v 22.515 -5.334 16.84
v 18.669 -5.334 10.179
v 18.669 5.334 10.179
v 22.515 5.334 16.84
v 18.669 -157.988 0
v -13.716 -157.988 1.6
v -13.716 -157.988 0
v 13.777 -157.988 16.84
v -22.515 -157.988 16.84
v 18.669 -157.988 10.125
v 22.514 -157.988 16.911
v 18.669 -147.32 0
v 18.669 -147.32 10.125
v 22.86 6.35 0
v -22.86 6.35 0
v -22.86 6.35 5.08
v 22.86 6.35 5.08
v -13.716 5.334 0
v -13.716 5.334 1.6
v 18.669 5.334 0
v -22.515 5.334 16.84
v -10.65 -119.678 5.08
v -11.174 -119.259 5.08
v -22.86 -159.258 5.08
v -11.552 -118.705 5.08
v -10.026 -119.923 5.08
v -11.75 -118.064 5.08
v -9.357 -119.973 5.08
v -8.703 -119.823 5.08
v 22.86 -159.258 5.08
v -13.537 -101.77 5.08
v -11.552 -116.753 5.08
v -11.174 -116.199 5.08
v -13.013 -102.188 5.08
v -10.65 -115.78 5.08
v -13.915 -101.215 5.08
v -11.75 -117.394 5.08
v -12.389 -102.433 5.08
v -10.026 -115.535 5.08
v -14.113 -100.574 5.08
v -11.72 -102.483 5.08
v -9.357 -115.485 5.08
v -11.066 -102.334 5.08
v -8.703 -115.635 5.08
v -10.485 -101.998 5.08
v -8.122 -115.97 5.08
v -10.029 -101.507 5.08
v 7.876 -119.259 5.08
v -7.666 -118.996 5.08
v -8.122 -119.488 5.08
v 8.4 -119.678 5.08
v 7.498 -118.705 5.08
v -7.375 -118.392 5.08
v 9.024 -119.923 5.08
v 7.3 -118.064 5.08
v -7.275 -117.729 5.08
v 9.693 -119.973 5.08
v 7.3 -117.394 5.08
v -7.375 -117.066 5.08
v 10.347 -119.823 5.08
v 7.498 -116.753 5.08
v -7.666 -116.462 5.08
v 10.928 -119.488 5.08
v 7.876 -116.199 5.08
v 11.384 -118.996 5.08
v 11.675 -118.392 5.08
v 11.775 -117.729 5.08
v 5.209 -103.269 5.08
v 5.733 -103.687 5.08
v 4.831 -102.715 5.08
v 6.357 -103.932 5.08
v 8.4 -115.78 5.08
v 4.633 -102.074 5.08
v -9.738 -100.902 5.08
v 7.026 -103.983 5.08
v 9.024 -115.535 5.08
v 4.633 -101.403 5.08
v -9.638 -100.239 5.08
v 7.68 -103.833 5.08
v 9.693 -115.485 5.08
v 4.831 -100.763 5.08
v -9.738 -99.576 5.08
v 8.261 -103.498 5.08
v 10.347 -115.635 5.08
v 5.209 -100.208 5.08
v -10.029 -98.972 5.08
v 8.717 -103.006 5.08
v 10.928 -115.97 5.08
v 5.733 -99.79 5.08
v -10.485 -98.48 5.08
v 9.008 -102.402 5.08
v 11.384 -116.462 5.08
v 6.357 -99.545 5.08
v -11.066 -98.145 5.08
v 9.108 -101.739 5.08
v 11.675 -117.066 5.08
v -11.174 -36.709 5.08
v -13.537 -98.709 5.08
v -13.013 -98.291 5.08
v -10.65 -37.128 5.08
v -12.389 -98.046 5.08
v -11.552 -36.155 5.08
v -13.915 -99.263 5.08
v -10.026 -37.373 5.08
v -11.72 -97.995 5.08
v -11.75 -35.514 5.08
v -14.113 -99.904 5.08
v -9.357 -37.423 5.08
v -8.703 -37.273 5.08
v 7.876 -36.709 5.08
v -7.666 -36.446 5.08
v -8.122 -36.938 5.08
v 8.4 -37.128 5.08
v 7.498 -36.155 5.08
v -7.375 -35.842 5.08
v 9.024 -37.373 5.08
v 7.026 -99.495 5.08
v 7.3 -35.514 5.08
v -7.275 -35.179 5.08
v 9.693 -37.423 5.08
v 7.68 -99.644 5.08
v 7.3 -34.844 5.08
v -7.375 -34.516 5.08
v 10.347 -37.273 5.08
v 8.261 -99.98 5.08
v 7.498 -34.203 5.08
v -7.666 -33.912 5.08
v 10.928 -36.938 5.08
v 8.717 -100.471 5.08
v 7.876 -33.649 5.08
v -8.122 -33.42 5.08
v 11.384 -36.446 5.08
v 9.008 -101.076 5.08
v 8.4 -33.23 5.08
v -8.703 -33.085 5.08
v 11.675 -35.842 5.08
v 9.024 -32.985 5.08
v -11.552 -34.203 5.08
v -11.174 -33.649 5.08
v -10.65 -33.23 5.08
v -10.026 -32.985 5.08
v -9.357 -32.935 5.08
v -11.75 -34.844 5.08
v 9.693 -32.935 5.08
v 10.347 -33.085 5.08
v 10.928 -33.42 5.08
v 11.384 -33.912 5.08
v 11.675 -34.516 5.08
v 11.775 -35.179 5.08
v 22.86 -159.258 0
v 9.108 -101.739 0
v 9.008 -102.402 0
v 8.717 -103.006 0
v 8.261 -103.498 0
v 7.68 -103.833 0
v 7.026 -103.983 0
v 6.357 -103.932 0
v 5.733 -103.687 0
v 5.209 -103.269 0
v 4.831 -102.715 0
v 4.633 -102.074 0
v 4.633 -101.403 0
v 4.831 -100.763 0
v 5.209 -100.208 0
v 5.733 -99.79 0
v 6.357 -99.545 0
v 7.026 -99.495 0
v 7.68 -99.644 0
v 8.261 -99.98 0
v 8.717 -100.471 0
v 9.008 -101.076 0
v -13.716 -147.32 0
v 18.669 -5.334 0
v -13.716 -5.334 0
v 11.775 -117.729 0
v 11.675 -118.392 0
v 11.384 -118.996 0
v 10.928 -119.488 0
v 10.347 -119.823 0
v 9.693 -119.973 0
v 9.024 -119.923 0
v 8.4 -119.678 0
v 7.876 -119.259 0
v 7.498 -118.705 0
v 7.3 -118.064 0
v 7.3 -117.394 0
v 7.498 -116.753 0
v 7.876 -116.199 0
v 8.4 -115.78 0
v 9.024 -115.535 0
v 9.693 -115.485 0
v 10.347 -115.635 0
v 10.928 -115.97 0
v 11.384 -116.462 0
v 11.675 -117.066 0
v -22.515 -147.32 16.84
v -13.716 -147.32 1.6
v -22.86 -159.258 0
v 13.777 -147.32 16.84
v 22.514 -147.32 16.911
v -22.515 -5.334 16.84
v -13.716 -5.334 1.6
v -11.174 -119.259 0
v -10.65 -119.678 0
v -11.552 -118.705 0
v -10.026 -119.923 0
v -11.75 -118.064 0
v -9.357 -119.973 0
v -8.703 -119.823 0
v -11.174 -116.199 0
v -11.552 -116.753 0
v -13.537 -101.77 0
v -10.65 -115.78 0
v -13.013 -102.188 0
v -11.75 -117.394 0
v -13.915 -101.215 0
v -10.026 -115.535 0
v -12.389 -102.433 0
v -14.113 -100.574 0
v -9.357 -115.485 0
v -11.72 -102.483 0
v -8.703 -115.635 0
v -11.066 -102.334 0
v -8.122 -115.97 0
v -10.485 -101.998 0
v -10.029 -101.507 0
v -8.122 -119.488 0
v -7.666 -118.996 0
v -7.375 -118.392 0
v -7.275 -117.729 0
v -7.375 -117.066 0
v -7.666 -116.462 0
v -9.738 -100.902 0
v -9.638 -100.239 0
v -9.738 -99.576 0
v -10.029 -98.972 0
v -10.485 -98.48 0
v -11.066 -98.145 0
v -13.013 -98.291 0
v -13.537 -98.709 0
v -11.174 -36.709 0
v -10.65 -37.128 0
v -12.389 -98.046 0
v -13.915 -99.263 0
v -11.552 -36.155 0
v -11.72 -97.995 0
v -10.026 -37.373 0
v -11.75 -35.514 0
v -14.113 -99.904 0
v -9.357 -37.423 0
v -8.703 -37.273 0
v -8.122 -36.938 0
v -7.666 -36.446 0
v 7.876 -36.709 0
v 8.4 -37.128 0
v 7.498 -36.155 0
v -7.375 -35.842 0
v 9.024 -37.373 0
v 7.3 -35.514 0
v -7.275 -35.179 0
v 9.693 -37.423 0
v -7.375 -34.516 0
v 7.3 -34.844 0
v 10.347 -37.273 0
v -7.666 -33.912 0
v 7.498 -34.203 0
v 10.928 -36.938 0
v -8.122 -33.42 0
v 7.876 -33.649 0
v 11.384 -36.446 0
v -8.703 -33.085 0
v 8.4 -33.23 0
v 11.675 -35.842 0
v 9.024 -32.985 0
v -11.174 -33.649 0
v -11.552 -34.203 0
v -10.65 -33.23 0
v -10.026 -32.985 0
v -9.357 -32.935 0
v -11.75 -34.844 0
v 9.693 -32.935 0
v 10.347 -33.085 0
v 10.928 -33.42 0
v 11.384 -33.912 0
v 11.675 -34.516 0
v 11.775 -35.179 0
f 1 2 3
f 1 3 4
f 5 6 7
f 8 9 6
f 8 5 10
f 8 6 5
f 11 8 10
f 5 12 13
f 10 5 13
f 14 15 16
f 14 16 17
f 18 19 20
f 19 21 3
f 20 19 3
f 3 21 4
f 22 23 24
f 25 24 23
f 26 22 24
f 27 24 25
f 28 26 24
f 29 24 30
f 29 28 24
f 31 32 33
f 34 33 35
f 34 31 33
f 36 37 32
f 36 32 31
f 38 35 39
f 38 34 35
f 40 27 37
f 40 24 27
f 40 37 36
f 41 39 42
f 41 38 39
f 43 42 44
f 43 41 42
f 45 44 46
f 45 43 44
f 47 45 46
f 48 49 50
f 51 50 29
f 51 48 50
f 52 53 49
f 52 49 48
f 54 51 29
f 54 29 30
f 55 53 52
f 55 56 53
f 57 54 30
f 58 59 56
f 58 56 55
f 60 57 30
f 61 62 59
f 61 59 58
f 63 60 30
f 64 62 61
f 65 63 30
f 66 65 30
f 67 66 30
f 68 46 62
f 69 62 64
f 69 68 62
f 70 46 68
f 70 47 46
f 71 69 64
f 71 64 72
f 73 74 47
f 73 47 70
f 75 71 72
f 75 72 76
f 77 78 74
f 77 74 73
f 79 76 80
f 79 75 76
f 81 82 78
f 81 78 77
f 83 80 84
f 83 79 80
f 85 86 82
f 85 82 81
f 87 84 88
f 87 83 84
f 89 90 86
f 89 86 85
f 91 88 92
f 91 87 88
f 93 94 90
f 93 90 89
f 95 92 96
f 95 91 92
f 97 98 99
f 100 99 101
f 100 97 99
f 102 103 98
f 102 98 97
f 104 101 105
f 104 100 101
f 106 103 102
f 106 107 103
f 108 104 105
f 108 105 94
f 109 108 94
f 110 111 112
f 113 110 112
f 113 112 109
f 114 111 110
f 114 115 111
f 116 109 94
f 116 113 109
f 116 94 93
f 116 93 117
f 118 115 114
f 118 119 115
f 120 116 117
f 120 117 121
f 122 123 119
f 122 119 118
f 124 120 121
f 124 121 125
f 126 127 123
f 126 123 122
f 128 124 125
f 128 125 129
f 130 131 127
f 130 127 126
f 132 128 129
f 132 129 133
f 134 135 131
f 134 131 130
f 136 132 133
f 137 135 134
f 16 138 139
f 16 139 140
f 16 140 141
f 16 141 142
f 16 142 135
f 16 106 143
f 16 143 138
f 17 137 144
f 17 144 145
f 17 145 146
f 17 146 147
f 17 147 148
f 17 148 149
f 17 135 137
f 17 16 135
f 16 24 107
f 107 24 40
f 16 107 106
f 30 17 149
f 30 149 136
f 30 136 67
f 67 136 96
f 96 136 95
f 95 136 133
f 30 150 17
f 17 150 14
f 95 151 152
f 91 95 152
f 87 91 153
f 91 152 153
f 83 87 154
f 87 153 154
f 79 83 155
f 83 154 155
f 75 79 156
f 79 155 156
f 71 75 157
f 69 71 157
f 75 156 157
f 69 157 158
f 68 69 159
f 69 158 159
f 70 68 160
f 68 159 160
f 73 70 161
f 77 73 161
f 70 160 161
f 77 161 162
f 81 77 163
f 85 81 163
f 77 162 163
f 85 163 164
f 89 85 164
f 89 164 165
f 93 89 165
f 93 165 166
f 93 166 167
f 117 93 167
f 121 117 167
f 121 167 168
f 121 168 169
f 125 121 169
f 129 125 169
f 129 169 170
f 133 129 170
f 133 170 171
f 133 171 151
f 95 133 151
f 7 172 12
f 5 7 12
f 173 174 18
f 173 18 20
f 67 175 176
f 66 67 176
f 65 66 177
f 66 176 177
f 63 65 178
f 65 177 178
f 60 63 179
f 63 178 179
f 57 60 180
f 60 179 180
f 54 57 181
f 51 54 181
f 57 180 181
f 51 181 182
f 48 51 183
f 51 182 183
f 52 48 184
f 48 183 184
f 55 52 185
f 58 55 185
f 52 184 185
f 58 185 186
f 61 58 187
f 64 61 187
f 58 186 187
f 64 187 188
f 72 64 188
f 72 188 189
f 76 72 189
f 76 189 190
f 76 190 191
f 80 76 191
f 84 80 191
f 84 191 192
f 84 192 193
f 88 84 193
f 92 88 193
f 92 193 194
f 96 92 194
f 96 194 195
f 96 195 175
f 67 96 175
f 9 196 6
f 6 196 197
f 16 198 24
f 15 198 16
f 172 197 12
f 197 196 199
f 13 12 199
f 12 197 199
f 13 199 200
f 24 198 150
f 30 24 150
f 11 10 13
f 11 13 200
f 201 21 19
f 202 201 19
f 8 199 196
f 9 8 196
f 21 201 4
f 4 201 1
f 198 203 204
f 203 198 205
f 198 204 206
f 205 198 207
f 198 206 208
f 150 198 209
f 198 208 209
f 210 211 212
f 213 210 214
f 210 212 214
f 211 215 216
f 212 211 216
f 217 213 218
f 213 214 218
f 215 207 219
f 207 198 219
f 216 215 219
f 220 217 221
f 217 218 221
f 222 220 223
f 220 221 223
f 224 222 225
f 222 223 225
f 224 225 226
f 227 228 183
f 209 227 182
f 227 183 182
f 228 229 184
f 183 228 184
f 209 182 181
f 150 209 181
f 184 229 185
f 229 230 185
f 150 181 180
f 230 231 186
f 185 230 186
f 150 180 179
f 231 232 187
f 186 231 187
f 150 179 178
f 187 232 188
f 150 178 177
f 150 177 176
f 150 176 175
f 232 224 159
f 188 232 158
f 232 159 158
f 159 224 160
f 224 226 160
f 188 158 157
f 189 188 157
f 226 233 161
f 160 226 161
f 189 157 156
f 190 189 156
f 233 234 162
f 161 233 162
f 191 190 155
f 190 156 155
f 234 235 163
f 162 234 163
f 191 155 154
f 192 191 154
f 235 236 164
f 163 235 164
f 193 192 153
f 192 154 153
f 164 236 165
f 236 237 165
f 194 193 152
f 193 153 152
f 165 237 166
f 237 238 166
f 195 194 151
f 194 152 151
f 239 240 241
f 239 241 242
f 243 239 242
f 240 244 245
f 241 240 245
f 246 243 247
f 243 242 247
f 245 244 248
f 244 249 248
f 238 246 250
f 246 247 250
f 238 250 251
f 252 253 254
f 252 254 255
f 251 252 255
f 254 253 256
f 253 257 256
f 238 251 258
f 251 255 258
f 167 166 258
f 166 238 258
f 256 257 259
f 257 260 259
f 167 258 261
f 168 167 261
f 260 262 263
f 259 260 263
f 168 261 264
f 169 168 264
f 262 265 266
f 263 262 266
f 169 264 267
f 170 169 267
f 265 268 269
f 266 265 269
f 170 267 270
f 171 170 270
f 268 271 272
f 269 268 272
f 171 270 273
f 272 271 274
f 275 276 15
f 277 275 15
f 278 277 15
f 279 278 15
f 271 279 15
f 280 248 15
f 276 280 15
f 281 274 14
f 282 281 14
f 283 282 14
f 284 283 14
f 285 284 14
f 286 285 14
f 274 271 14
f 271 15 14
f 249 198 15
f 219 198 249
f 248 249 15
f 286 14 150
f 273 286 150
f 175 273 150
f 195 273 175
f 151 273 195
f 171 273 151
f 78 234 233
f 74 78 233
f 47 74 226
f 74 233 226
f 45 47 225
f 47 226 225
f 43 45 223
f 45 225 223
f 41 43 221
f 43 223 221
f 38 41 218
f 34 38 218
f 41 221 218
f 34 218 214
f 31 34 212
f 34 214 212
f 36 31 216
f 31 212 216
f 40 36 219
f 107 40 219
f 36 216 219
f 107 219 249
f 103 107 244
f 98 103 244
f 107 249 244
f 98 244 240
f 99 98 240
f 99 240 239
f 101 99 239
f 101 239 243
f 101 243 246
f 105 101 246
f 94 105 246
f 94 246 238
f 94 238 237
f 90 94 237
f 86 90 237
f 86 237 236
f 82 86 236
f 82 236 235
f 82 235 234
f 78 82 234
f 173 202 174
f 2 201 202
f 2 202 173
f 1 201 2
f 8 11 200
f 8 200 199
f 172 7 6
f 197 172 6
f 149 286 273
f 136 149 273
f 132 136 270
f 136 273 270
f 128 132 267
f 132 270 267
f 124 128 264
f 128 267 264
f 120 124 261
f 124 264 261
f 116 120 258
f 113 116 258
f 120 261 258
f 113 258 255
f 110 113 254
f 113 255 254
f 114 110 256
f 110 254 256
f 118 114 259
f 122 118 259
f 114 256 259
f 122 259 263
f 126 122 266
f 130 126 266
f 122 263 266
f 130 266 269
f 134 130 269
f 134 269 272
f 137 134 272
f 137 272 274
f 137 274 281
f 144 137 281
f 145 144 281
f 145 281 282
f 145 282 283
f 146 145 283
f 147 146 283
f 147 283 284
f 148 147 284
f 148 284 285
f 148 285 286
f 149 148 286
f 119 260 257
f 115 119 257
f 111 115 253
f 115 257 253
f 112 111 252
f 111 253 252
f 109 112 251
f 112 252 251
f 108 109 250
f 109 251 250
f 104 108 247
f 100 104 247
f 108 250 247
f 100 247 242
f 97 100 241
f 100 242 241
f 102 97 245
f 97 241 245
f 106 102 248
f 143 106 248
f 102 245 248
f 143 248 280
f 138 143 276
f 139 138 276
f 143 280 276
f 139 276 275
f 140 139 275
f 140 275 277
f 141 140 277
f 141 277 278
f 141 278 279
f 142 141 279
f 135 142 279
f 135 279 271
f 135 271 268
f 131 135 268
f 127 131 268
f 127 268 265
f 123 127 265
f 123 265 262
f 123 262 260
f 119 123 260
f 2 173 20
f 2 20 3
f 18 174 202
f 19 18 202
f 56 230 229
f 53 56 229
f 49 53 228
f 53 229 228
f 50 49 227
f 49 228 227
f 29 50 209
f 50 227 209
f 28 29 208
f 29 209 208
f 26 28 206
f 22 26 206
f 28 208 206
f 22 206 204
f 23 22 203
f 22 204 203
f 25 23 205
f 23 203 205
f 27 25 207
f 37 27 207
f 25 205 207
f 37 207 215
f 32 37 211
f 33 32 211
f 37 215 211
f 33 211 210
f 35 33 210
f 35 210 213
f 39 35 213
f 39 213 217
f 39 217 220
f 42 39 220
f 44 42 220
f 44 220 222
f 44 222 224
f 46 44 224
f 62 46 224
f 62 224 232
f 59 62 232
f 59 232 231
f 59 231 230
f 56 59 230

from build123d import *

# Parameters (mm, degrees)
SKETCH_W      = 45.72
SKETCH_H      = 165.608
PAD_DEPTH     = 5.08
SKETCH005_R   = 2.25
HOLE_DEPTH    = 24.9936
SKETCH010_R   = 2.25
HOLE001_DEPTH = 24.9936
SKETCH006_W   = 32.385
SKETCH006_H   = 16.8402
PAD005_DEPTH  = 5.334
PAD006_DEPTH  = 5.334
SKETCH008_W   = 32.385
SKETCH008_H   = 16.8402
PAD007_DEPTH  = 10.668
PAD008_DEPTH  = 10.668


with BuildPart() as body:
    # Sketch → Pad (new body)
    with BuildSketch(Plane.XY):
        with Locations((0, -76.454)):
            Rectangle(SKETCH_W, SKETCH_H)
    extrude(amount=PAD_DEPTH)

    # Sketch005 → Hole (cut)
    with BuildSketch(Plane(origin=(0, 0, 0), x_dir=(1, 0, 0), z_dir=(0, 0, -1))):
        with Locations((-9.525, 117.729)):
            Circle(SKETCH005_R)
        with Locations((-9.525, 35.179)):
            Circle(SKETCH005_R)
        with Locations((9.525, 117.729)):
            Circle(SKETCH005_R)
        with Locations((9.525, 35.179)):
            Circle(SKETCH005_R)
    extrude(amount=-HOLE_DEPTH, mode=Mode.SUBTRACT)

    # Sketch010 (on Face4 of Hole) → Hole001 (cut)
    with BuildSketch(Plane(origin=(0, 0, 0), x_dir=(1, 0, 0), z_dir=(0, 0, -1))):
        with Locations((-11.888124, 100.23912)):
            Circle(SKETCH010_R)
        with Locations((6.858004, 101.738808)):
            Circle(SKETCH010_R)
    extrude(amount=-HOLE001_DEPTH, mode=Mode.SUBTRACT)


with BuildPart() as pad006:
    # Sketch006 → Pad005 (new body, symmetric)
    with BuildSketch(Plane.XZ):
        with Locations((2.4765, 8.4201)):
            Rectangle(SKETCH006_W, SKETCH006_H)
    extrude(amount=PAD005_DEPTH, both=True)

    # Sketch007 → Pad006 (new body, symmetric)
    with BuildSketch(Plane.XZ):
        Polygon((-13.716, 1.6002), (-13.716, 16.8402), (-22.514818, 16.8402), align=None)
        Polygon((13.716, 1.6002), (22.514818, 16.8402), (13.716, 16.8402), align=None)
    extrude(amount=PAD006_DEPTH, both=True)


with BuildPart() as pad008:
    # Sketch008 → Pad007 (new body)
    with BuildSketch(Plane.XZ.offset(147.32)):
        with Locations((2.4765, 8.4201)):
            Rectangle(SKETCH008_W, SKETCH008_H)
    extrude(amount=PAD007_DEPTH)

    # Sketch009 → Pad008 (new body)
    with BuildSketch(Plane.XZ.offset(147.32)):
        Polygon((-13.716, 1.6002), (-13.716, 16.8402), (-22.514818, 16.8402), align=None)
        Polygon((13.838348, 1.6002), (22.514164, 16.910556), (13.715632, 16.839706), align=None)
    extrude(amount=PAD008_DEPTH)


solid = Compound([body.part, pad006.part, pad008.part])
